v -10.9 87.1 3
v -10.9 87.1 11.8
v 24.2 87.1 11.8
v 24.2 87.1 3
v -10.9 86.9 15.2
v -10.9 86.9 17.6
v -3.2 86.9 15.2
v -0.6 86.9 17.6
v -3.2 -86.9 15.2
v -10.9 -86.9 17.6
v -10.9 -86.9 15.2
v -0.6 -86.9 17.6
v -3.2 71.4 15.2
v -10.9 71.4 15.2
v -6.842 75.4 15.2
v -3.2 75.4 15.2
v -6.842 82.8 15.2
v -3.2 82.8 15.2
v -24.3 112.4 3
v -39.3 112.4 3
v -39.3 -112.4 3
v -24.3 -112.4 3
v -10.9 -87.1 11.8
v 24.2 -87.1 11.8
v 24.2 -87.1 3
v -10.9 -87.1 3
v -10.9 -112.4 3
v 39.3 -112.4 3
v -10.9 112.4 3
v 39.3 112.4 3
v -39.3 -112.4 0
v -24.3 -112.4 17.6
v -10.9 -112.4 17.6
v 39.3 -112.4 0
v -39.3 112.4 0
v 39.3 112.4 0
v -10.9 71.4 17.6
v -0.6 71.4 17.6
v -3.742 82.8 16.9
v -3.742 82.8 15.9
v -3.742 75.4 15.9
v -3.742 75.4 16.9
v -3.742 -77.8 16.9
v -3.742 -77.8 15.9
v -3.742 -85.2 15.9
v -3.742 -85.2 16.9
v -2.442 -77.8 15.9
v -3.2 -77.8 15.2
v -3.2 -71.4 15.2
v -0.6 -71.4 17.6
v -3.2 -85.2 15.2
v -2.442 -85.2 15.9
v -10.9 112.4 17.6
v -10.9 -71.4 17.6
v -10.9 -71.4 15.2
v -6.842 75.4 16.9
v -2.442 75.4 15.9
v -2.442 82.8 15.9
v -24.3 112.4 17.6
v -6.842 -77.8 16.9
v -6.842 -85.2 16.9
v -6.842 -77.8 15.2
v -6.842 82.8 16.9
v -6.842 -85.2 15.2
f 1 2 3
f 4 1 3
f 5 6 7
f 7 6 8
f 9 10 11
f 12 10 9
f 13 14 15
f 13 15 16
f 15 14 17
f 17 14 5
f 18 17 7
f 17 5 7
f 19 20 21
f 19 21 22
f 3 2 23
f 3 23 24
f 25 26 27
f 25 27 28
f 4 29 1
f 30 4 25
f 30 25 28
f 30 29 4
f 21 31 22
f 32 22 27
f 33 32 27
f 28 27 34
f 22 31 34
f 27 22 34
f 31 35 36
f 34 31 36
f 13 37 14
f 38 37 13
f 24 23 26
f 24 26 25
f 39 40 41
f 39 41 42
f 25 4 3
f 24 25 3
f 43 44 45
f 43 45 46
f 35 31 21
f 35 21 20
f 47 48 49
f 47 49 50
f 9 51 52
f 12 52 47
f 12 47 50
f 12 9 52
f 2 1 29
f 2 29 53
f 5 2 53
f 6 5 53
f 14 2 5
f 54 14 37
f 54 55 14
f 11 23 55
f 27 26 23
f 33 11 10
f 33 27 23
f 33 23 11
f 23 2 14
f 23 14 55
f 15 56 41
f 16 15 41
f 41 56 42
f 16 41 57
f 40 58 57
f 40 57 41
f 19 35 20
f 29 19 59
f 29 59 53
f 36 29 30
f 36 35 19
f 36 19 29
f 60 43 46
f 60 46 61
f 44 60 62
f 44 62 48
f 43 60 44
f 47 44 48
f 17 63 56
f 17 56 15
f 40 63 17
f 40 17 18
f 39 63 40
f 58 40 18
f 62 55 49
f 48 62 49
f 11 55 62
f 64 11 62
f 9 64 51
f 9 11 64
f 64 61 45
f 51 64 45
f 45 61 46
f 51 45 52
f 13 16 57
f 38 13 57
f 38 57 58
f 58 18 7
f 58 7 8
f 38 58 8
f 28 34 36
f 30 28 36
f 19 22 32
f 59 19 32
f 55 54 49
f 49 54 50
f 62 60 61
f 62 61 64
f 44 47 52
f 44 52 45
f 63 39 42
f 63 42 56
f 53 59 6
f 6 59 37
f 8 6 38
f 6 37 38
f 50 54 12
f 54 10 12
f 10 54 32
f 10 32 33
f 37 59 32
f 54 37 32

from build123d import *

# Parameters (mm, degrees)
F0_W      = 78.6
F0_H      = 224.8
F1_DEPTH  = 3
F2_W      = 13.4
F2_H      = 14.6
F3_DEPTH  = 224.8
F5_W      = 35.1
F5_H      = 8.8
F6_DEPTH  = 174
F8_DEPTH  = 15.5
F12_DEPTH = 7.4
F15_DEPTH = 7.4


with BuildPart() as f1:
    # F0 (on Top) → F1 (new body)
    with BuildSketch(Plane.XY):
        Rectangle(F0_W, F0_H)
    extrude(amount=F1_DEPTH)

    # F2 (on face) → F3 (join, through all)
    with BuildSketch(Plane.XZ.offset(112.4)):
        with Locations((-17.6, 10.3)):
            Rectangle(F2_W, F2_H)
    extrude(amount=-F3_DEPTH)

    # F5 (on offset) → F6 (join)
    with BuildSketch(Plane.XZ.offset(86.9)):
        with Locations((6.65, 7.4)):
            Rectangle(F5_W, F5_H)
    extrude(amount=-F6_DEPTH)

    # F7 (on offset) → F8 (join)
    with BuildSketch(Plane.XZ.offset(86.9)):
        Polygon((-10.9, 17.6), (-10.9, 15.2), (-3.2, 15.2), (-0.6, 17.6), align=None)
    extrude(amount=-F8_DEPTH)

    # F9: F1 across plane


with BuildPart() as f1_1:
    add(f1.part)
    add(f1.part.mirror(Plane.XZ))

    # F11 (on offset) → F12 (cut)
    with BuildSketch(Plane.XZ.offset(85.2)):
        Polygon((-6.8416666667, 16.9), (-6.8416666667, 15.2), (-3.2, 15.2), (-2.4416666667, 15.9), (-3.7416666667, 15.9), (-3.7416666667, 16.9), align=None)
    extrude(amount=-F12_DEPTH, mode=Mode.SUBTRACT)

    # F14 (on offset) → F15 (cut)
    with BuildSketch(Plane.XZ.offset(-75.4)):
        Polygon((-6.8416666667, 16.9), (-6.8416666667, 15.2), (-3.2, 15.2), (-2.4416666667, 15.9), (-3.7416666667, 15.9), (-3.7416666667, 16.9), align=None)
    extrude(amount=-F15_DEPTH, mode=Mode.SUBTRACT)


solid = f1_1.part
